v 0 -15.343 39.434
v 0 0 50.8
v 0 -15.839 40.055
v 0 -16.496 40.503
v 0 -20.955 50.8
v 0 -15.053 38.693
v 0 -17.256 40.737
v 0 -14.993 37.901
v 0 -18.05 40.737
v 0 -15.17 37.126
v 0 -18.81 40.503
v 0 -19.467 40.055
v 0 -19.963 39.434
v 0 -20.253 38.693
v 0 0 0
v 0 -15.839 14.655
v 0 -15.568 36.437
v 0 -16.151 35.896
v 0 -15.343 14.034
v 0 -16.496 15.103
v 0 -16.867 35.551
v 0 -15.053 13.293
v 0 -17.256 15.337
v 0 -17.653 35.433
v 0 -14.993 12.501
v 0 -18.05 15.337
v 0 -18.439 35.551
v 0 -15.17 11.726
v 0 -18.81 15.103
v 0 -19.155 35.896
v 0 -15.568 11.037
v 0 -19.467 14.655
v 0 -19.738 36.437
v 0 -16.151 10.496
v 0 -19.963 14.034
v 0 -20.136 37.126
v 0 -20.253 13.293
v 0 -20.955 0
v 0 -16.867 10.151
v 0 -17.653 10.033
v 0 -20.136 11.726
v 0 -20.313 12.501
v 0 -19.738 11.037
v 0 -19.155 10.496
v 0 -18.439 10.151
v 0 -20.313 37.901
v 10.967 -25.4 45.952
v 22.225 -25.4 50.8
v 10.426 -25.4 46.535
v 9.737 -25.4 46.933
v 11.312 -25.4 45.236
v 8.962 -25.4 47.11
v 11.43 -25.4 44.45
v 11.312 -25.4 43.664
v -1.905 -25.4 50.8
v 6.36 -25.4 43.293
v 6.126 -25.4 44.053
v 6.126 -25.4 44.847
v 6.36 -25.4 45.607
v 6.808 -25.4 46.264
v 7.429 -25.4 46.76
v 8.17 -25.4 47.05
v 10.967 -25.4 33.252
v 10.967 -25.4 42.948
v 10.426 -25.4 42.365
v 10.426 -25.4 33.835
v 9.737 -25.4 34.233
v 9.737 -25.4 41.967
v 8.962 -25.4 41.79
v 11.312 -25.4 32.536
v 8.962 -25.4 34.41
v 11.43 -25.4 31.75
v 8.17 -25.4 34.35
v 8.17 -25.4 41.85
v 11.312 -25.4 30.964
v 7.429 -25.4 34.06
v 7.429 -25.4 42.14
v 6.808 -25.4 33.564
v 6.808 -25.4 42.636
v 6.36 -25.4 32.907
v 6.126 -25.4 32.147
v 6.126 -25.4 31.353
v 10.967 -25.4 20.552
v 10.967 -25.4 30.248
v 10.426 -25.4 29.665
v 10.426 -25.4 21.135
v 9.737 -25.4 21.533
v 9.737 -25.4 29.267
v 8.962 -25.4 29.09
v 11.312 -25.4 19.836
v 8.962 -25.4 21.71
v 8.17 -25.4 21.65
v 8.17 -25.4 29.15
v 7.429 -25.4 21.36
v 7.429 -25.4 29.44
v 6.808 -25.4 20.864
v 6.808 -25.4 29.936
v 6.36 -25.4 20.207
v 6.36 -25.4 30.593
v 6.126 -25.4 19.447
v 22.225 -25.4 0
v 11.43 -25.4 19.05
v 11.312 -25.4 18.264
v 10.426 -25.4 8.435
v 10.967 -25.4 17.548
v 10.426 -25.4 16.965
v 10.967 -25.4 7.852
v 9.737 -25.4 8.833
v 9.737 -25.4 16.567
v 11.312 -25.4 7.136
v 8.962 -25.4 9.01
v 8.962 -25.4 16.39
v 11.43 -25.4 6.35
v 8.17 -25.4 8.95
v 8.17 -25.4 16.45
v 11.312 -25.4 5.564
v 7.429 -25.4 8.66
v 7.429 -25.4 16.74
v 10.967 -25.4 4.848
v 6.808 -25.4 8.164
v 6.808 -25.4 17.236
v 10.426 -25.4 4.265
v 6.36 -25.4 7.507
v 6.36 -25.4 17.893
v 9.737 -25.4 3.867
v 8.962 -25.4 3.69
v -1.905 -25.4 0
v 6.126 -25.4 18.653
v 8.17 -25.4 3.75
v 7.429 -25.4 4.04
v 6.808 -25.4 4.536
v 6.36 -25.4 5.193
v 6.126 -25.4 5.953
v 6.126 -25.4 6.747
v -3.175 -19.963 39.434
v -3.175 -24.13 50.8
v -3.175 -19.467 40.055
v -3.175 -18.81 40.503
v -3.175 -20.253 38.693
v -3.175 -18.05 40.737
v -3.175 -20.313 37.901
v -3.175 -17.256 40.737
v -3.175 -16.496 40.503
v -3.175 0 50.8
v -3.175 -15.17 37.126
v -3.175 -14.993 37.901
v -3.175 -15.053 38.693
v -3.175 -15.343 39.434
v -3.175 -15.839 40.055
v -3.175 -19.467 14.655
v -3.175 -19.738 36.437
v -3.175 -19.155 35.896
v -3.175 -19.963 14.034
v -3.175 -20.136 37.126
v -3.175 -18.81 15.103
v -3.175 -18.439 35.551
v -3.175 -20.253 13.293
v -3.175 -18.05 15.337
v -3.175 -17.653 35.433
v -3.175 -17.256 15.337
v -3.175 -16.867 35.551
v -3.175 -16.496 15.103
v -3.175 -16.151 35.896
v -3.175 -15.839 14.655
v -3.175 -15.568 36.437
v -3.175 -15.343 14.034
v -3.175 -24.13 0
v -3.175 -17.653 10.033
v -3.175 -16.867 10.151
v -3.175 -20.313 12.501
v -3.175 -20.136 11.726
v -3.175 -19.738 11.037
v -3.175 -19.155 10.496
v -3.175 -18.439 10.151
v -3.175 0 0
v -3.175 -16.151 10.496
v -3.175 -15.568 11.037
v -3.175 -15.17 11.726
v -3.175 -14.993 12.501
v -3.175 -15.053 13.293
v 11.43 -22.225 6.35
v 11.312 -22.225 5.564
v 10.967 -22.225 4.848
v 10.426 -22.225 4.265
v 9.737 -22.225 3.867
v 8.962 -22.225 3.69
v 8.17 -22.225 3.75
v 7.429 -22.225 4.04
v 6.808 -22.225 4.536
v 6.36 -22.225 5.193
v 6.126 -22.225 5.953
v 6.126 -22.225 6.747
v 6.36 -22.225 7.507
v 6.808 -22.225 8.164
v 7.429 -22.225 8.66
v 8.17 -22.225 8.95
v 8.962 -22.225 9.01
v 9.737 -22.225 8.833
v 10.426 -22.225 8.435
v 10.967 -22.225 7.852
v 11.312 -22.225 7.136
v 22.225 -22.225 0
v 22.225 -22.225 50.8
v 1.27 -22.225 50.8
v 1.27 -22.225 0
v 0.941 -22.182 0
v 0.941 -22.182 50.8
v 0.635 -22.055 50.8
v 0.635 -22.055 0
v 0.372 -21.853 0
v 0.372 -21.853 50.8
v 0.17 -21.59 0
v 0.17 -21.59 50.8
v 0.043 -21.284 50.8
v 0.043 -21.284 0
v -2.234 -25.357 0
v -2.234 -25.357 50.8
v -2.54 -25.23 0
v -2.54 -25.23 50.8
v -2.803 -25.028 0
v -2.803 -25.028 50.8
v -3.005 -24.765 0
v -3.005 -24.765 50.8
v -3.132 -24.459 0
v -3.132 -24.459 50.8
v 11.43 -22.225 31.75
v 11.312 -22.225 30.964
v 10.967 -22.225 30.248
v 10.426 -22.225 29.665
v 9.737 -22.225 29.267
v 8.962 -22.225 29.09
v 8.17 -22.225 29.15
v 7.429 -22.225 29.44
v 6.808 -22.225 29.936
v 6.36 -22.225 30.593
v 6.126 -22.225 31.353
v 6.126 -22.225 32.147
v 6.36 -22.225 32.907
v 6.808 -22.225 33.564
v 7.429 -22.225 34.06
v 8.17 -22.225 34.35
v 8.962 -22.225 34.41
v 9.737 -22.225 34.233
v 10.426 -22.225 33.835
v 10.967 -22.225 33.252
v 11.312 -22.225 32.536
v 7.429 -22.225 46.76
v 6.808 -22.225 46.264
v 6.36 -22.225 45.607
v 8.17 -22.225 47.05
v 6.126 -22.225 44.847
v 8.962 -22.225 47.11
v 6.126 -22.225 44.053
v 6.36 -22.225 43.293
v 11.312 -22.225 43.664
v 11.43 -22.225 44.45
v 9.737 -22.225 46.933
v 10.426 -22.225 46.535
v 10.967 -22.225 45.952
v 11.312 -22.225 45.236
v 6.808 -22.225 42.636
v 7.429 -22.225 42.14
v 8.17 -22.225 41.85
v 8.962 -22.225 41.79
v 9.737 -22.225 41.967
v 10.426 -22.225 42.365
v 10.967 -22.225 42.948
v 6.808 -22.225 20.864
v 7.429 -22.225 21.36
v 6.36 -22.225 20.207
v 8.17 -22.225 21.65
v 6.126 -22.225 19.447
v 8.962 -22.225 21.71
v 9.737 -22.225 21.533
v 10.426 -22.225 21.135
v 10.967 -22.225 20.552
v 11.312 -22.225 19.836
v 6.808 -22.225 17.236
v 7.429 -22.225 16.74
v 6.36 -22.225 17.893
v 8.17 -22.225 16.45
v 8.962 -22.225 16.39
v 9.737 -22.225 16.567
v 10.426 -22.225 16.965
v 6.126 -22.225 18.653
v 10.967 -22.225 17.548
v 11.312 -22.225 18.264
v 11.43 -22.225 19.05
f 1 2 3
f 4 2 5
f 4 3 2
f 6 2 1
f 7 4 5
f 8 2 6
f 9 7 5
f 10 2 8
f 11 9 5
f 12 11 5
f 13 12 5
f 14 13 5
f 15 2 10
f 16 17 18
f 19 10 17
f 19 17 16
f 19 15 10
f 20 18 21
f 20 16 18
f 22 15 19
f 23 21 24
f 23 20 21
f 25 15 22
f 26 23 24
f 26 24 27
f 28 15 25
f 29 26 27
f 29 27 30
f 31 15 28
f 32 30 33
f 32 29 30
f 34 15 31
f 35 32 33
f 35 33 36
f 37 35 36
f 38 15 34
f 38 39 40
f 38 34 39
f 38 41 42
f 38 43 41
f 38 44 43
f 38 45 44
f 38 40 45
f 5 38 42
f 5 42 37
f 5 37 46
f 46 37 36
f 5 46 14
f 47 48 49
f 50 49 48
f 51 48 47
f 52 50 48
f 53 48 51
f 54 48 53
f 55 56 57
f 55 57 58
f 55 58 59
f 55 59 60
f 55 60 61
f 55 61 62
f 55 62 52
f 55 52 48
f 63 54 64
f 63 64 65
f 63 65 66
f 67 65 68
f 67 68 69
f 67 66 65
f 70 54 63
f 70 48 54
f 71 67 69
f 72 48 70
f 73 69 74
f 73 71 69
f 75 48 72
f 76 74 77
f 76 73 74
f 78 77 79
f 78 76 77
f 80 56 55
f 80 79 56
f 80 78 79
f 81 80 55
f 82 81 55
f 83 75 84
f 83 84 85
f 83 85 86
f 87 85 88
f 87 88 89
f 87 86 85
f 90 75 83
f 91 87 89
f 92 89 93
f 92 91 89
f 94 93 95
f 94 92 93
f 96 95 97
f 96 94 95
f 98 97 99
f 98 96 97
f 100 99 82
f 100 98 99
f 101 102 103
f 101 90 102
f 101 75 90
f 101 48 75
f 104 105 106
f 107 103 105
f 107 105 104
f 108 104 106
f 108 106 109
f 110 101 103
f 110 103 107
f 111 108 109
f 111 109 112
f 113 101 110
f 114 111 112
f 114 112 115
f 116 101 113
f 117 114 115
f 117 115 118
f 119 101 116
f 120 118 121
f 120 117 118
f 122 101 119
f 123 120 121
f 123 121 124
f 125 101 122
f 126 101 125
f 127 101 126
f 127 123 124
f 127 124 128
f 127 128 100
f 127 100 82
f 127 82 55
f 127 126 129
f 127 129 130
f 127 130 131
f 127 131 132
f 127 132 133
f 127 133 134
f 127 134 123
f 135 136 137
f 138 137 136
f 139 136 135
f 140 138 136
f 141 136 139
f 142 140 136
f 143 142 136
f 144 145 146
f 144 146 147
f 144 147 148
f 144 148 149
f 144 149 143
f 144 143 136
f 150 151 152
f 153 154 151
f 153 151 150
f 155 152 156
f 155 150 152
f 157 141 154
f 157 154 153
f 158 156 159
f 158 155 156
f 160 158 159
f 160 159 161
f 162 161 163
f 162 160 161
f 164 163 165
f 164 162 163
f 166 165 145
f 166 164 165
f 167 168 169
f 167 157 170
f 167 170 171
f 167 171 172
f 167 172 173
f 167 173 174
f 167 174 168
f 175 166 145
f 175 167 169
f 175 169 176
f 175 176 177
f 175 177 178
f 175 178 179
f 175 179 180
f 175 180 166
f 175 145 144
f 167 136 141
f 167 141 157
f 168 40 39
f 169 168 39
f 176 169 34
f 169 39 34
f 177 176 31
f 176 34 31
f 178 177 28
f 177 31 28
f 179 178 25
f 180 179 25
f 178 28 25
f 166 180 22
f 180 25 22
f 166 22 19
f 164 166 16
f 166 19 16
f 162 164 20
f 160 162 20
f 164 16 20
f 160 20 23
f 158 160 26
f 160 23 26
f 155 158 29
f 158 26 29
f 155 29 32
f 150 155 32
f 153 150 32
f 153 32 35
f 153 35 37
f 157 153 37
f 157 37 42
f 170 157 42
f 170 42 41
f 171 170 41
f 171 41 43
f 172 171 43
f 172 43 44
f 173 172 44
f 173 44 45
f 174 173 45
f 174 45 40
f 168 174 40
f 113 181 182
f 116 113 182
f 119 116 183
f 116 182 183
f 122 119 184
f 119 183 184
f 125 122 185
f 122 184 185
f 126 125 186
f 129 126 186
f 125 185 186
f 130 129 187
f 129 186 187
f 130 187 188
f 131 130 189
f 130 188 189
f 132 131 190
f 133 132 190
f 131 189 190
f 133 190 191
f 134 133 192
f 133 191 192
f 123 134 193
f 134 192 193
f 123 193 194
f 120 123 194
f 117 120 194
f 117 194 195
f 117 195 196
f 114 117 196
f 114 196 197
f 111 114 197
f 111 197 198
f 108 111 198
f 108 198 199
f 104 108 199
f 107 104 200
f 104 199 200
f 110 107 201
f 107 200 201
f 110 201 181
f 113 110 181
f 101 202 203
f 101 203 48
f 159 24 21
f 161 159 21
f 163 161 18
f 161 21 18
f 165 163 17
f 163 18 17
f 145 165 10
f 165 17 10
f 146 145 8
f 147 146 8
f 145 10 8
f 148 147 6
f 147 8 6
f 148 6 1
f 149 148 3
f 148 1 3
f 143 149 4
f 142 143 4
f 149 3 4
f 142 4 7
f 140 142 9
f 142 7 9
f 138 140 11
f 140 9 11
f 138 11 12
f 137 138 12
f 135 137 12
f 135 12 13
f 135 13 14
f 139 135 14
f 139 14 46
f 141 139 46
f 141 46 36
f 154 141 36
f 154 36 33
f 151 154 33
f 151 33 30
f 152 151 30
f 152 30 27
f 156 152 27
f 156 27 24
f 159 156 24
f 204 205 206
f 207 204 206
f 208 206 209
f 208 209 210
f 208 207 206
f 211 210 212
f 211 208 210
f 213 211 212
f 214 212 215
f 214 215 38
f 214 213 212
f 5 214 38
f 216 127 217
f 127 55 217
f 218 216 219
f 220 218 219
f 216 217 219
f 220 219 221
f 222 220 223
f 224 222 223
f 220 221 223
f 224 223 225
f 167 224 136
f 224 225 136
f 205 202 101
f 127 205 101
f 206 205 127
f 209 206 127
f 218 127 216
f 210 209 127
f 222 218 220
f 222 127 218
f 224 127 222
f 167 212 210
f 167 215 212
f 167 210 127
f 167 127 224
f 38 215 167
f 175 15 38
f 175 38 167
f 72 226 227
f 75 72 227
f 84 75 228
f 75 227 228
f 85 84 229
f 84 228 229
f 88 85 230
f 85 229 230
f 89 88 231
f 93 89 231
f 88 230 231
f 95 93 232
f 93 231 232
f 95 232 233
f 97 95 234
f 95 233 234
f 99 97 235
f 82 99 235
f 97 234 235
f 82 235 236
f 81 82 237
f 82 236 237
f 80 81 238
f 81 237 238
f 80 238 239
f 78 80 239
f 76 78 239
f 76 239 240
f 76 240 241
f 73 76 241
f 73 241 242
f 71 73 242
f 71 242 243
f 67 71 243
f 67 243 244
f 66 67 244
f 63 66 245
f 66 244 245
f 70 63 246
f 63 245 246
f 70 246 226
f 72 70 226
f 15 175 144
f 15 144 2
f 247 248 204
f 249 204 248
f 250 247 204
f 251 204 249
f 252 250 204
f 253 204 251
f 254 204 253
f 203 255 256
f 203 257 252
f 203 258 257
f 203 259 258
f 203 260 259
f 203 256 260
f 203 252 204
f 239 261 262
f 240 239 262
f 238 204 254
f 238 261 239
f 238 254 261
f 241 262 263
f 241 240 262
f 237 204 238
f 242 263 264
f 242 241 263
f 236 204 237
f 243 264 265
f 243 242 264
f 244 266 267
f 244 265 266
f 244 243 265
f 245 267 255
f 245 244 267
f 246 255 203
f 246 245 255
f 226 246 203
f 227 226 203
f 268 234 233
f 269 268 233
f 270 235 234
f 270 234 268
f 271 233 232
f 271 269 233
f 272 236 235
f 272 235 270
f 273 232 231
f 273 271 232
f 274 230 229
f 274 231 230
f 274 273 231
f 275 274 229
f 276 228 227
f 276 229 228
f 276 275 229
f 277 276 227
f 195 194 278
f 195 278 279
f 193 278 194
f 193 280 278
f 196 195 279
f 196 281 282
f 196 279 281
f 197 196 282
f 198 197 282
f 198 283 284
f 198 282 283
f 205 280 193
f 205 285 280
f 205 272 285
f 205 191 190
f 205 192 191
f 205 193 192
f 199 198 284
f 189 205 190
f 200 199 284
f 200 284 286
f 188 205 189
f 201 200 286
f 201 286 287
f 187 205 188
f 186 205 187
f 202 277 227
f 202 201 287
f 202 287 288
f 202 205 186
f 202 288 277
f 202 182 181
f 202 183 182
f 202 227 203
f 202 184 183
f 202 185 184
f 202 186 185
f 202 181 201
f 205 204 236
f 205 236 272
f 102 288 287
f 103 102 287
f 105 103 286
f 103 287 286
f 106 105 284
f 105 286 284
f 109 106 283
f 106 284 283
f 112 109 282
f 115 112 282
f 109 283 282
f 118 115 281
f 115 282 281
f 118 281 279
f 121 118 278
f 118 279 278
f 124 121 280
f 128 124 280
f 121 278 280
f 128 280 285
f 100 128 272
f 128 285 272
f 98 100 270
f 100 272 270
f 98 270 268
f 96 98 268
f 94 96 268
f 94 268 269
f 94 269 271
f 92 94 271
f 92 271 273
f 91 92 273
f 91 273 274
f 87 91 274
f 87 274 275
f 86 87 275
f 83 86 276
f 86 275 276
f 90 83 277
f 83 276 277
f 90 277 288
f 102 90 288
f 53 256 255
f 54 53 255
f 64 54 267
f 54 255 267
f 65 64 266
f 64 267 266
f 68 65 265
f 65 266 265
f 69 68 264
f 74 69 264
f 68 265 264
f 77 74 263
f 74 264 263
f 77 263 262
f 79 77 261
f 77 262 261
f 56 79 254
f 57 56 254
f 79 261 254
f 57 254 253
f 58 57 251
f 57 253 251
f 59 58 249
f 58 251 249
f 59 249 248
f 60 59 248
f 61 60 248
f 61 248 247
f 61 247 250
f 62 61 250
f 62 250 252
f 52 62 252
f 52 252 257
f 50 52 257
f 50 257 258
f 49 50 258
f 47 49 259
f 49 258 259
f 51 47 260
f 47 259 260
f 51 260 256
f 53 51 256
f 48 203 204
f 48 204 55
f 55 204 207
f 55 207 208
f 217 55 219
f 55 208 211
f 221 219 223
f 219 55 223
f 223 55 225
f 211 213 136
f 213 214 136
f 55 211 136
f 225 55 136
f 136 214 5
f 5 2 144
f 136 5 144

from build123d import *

# Parameters (mm, degrees)
BOSS_EXTRUDE1_DEPTH     = 50.8
SKETCH2_R               = 2.667
CUT_EXTRUDE1_DEPTH      = 23.225
CUT_EXTRUDE1_DEPTH_BACK = 4.175
SKETCH3_R               = 2.667
CUT_EXTRUDE2_DEPTH      = 3.175
FILLET1_R               = 1.27
FILLET2_R               = 1.27


with BuildPart() as part:
    # Sketch1 → Boss-Extrude1 (new body)
    with BuildSketch(Plane.XY):
        Polygon((0, -22.225), (22.225, -22.225), (22.225, -25.4), (-3.175, -25.4), (-3.175, 0), (0, 0), align=None)
    extrude(amount=BOSS_EXTRUDE1_DEPTH)

    # Sketch2 → Cut-Extrude1 (cut, two sides)
    with BuildSketch(Plane(origin=(0, 0, 0), x_dir=(0, 0, -1), z_dir=(1, 0, 0))) as cut_extrude1_sk:
        with Locations((-38.1, -17.653)):
            Circle(SKETCH2_R)
        with Locations((-12.7, -17.653)):
            Circle(SKETCH2_R)
    extrude(amount=CUT_EXTRUDE1_DEPTH, mode=Mode.SUBTRACT)
    extrude(cut_extrude1_sk.sketch, amount=-CUT_EXTRUDE1_DEPTH_BACK, mode=Mode.SUBTRACT)

    # Sketch3 → Cut-Extrude2 (cut)
    with BuildSketch(Plane(origin=(0, -22.225, 0), x_dir=(1, 0, 0), z_dir=(0, 1, 0))):
        with Locations((8.763, -44.45)):
            Circle(SKETCH3_R)
        with Locations((8.763, -31.75)):
            Circle(SKETCH3_R)
        with Locations((8.763, -19.05)):
            Circle(SKETCH3_R)
        with Locations((8.763, -6.35)):
            Circle(SKETCH3_R)
    extrude(amount=-CUT_EXTRUDE2_DEPTH, mode=Mode.SUBTRACT)

    # Fillet1
    fillet1_edges = [part.edges().sort_by_distance(p)[0] for p in [
        (0, -22.225, 25.4),
    ]]
    fillet(fillet1_edges, radius=FILLET1_R)

    # Fillet2
    fillet2_edges = [part.edges().sort_by_distance(p)[0] for p in [
        (-3.175, -25.4, 25.4),
    ]]
    fillet(fillet2_edges, radius=FILLET2_R)


solid = part.part
